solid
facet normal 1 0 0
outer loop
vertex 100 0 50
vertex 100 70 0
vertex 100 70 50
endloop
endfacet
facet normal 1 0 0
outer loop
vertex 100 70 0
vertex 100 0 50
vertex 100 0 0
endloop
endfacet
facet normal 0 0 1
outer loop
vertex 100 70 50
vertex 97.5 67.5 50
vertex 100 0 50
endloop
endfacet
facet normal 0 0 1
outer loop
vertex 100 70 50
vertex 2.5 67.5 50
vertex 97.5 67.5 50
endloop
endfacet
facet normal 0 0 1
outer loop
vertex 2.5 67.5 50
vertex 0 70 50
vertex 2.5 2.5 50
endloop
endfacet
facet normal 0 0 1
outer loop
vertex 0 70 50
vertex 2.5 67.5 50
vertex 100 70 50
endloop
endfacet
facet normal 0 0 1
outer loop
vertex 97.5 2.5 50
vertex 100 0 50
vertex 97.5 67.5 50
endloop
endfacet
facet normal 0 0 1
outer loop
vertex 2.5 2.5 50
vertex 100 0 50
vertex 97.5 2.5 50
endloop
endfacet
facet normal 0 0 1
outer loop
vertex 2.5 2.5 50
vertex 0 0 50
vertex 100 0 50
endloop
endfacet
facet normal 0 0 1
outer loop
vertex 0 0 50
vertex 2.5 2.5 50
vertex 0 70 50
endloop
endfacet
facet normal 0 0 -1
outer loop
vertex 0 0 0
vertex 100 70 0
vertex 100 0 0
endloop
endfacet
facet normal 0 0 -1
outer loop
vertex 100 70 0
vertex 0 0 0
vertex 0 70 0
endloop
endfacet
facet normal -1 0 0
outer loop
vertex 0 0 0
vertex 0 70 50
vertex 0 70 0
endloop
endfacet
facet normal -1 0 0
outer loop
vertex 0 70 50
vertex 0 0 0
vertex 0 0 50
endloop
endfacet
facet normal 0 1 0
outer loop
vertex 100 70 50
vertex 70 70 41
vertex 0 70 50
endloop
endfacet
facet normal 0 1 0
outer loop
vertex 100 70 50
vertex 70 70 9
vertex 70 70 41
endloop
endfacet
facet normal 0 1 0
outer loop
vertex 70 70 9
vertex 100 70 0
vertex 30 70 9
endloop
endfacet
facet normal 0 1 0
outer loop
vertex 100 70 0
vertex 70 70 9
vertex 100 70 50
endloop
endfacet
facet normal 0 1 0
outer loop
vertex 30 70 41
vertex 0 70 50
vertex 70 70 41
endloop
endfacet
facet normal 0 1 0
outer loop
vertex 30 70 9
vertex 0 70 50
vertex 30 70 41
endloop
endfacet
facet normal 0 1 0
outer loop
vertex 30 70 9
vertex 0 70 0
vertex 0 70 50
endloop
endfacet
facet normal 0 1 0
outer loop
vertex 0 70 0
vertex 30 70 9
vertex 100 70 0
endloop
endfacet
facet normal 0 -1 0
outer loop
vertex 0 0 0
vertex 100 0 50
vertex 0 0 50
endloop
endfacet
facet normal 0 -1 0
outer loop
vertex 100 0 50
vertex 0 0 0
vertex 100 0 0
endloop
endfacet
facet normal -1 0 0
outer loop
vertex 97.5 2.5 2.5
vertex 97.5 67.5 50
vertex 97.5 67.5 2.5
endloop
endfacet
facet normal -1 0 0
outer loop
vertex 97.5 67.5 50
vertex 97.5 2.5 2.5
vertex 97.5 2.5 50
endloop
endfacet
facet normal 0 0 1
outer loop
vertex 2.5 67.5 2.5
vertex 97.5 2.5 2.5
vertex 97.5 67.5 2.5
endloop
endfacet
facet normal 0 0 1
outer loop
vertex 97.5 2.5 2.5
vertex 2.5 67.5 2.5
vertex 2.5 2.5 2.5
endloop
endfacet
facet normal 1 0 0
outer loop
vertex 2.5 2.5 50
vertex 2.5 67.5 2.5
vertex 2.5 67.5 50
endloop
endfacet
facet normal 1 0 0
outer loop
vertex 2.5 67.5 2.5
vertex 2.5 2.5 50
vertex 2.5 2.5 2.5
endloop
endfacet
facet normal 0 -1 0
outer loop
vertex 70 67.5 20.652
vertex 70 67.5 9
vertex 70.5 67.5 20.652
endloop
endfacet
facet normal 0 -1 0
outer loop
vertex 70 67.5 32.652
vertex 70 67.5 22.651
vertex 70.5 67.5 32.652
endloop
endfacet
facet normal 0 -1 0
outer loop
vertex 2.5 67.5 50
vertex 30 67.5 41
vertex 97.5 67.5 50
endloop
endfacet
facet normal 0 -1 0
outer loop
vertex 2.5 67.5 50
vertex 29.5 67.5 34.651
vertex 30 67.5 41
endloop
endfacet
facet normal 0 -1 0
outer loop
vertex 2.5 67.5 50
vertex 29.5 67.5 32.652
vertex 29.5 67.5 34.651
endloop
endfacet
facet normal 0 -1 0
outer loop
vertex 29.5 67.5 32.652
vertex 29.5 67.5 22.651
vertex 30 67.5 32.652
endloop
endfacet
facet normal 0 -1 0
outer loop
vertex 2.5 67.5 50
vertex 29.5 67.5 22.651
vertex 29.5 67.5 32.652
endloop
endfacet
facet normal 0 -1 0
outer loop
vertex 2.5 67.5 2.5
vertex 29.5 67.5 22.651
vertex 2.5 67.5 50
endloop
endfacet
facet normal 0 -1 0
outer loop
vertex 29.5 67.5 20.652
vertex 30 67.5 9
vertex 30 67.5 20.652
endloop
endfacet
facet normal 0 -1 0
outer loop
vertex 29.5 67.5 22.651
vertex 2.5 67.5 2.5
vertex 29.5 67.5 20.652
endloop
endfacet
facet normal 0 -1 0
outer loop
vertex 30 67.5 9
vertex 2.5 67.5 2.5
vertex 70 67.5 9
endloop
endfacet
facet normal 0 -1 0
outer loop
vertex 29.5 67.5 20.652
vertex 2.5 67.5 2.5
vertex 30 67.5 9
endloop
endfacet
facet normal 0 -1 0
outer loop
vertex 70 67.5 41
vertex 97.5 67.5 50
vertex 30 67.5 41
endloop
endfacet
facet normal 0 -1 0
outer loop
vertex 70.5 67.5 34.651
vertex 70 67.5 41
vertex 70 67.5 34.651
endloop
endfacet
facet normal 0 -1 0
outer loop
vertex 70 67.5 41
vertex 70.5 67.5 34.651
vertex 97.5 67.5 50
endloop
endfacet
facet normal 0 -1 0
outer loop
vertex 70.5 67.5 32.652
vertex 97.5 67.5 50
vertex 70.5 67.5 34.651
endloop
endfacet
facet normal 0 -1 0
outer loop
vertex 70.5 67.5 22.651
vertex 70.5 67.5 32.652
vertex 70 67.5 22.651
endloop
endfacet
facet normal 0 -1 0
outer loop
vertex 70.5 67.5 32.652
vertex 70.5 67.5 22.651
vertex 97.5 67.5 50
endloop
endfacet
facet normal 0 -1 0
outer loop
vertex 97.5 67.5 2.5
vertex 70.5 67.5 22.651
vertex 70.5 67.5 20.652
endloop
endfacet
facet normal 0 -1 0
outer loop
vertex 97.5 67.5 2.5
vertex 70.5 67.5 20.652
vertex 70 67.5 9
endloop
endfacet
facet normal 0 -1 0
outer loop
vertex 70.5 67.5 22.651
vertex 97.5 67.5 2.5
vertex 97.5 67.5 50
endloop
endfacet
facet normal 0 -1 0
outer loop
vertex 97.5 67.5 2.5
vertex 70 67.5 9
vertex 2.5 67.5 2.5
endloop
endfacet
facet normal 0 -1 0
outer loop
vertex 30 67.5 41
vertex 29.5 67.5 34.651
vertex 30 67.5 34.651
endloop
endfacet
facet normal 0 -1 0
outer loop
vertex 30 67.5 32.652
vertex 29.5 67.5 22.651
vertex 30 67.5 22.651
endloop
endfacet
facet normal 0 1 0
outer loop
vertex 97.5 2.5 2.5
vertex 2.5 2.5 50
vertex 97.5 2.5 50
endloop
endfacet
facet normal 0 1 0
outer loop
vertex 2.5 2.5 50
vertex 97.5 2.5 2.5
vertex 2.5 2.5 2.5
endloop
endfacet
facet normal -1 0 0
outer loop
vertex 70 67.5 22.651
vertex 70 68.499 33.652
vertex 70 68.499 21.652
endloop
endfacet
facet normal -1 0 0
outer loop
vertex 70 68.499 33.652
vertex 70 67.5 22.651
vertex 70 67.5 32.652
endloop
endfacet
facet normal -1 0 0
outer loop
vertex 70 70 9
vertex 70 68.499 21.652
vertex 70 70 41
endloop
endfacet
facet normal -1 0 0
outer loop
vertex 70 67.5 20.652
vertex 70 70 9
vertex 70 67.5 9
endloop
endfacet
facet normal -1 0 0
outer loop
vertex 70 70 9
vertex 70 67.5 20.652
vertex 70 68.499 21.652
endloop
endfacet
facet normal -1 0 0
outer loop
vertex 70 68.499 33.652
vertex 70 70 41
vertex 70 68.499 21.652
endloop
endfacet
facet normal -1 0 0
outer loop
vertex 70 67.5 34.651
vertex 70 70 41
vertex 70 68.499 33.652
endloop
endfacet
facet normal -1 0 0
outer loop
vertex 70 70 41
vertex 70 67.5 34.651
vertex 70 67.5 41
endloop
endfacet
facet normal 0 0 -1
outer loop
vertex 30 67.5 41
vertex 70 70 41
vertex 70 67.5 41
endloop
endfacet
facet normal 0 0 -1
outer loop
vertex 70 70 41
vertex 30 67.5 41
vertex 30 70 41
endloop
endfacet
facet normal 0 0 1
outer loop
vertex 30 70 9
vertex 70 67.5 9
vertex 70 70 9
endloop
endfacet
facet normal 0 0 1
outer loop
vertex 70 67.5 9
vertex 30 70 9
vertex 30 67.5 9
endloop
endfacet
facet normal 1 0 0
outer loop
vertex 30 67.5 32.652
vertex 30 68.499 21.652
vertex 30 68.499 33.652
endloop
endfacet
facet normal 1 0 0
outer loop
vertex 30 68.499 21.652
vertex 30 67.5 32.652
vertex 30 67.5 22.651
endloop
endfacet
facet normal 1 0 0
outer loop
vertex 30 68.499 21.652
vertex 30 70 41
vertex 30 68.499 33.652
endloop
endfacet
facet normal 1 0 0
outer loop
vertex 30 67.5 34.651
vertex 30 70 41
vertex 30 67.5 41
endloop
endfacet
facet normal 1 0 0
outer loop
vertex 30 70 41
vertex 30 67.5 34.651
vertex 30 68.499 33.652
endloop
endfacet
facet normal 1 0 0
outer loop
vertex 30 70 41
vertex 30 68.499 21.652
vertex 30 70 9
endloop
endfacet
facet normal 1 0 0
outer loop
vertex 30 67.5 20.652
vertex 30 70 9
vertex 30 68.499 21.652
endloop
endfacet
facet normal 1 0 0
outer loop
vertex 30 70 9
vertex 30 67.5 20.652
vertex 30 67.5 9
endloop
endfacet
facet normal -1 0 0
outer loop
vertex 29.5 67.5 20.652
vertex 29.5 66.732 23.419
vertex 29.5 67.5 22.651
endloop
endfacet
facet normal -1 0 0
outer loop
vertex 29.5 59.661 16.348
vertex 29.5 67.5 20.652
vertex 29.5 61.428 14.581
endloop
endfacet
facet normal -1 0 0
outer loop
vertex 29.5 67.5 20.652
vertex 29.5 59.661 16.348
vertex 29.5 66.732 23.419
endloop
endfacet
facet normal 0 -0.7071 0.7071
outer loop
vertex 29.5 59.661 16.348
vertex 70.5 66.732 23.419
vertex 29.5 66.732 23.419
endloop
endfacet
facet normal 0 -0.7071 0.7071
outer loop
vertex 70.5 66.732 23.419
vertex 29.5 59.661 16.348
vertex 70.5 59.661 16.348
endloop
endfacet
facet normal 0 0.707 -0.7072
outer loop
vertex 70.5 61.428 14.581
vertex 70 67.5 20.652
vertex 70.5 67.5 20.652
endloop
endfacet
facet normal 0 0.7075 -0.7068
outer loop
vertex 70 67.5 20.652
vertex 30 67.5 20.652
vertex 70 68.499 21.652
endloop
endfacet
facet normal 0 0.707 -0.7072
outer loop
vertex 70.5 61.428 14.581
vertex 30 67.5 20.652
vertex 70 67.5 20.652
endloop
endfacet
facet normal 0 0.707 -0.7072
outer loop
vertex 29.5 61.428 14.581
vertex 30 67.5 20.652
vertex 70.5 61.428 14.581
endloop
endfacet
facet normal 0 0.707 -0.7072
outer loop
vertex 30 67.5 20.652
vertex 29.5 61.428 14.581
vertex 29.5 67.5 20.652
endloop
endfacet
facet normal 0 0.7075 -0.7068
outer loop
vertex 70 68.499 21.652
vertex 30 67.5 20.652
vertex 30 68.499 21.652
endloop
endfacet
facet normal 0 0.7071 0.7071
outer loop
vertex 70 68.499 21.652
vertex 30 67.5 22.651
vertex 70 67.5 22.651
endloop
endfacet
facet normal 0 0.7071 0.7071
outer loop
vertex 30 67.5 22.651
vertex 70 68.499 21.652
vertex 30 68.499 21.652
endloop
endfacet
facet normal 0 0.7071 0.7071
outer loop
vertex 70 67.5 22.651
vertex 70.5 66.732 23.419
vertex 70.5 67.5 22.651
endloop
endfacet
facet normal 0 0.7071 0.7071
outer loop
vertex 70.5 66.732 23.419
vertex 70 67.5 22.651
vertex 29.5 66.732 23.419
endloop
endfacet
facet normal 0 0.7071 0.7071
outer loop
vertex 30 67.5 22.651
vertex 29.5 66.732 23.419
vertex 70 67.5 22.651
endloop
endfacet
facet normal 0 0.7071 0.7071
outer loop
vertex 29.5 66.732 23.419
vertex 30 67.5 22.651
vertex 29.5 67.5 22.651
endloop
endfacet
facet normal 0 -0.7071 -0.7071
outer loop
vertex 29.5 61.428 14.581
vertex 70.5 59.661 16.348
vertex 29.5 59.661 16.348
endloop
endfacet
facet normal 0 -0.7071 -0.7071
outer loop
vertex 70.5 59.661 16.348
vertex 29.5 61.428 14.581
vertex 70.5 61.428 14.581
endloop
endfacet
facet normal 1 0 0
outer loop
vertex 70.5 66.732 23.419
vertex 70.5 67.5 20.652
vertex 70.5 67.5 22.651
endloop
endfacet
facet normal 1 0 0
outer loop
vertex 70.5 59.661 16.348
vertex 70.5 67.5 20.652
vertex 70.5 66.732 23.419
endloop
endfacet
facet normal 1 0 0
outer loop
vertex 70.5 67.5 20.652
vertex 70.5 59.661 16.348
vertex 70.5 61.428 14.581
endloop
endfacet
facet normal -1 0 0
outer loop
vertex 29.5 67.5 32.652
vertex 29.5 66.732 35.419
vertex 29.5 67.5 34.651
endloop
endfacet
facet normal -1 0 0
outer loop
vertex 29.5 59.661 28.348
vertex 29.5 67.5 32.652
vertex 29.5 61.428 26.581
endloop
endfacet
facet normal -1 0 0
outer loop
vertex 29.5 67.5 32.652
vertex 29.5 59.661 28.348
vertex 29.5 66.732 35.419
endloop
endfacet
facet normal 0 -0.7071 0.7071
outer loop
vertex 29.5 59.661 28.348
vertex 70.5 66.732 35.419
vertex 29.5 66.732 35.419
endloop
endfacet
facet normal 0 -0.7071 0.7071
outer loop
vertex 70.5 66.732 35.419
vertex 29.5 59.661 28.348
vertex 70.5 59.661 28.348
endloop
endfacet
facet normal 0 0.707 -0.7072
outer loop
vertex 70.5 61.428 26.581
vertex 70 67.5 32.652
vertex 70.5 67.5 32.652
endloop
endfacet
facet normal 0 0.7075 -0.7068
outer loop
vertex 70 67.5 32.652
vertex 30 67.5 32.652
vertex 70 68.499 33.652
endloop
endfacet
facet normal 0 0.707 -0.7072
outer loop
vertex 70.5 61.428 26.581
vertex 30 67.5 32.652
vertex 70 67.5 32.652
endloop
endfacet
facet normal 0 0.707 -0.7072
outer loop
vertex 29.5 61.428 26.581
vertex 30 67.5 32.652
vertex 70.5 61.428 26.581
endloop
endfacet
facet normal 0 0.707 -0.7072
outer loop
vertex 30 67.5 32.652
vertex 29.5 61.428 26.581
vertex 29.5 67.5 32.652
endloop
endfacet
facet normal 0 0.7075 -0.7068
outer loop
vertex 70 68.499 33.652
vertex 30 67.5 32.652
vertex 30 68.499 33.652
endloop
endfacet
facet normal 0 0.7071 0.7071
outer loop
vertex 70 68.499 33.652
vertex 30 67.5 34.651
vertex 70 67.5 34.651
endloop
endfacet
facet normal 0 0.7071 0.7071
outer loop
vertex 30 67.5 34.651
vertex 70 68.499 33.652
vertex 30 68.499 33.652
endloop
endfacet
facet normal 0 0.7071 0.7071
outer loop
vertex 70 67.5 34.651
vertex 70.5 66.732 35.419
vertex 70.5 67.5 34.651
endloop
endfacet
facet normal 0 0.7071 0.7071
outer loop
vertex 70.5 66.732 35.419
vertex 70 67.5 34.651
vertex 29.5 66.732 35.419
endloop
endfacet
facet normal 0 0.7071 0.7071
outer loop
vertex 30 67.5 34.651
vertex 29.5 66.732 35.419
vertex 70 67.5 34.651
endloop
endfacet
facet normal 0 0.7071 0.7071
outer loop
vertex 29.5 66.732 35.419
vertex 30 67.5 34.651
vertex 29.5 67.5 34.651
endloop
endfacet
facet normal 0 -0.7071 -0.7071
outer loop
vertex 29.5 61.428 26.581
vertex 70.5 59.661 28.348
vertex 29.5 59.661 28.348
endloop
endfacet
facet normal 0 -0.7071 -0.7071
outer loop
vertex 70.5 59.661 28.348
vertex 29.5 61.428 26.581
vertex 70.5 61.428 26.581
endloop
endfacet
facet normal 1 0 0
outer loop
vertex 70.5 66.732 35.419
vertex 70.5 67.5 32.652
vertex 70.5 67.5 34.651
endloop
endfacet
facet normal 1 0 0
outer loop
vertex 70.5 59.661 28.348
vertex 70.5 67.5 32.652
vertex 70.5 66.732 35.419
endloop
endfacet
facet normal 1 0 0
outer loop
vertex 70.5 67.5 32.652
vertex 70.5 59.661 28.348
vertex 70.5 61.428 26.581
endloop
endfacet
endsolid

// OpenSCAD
$fn = 32;

// ----------------------------------------------------------------------
// Vent box: louvers enclosure
// ----------------------------------------------------------------------

// --- parameters (mm) ---
box_l = 100;              // box length, X
box_w = 70;               // box width, Y
box_h = 50;               // box height, Z
wall_t = 2.5;             // shell wall thickness
win_l = 40;               // vent window width, X
win_h = 32;               // vent window height, Z
slat_t = 2.5;             // louver slat thickness
slat_d = 10;              // louver slat depth
slat_a = 45;              // louver slat angle, degrees
slat_pitch = 12;          // louver pitch
slat_yc = 64.08;          // slat centreline Y

win_z0 = (box_h - win_h) / 2;  // window lower edge Z
n_slats = 2;  // louver count
slat_z0 = win_z0 + (win_h - (n_slats - 1) * slat_pitch) / 2;

difference() {
  union() {
    difference() {
      cube([box_l, box_w, box_h]);
  translate([wall_t, wall_t, wall_t])
    cube([box_l - 2 * wall_t, box_w - 2 * wall_t, box_h]);
  translate([(box_l - win_l) / 2, box_w - wall_t - 1, win_z0])
    cube([win_l, wall_t + 2, win_h]);
    }
    for (i = [0 : n_slats - 1])
      translate([box_l / 2, slat_yc, slat_z0 + i * slat_pitch])
        rotate([slat_a, 0, 0])
          cube([win_l + 1, slat_d, slat_t], center = true);
  }
}
